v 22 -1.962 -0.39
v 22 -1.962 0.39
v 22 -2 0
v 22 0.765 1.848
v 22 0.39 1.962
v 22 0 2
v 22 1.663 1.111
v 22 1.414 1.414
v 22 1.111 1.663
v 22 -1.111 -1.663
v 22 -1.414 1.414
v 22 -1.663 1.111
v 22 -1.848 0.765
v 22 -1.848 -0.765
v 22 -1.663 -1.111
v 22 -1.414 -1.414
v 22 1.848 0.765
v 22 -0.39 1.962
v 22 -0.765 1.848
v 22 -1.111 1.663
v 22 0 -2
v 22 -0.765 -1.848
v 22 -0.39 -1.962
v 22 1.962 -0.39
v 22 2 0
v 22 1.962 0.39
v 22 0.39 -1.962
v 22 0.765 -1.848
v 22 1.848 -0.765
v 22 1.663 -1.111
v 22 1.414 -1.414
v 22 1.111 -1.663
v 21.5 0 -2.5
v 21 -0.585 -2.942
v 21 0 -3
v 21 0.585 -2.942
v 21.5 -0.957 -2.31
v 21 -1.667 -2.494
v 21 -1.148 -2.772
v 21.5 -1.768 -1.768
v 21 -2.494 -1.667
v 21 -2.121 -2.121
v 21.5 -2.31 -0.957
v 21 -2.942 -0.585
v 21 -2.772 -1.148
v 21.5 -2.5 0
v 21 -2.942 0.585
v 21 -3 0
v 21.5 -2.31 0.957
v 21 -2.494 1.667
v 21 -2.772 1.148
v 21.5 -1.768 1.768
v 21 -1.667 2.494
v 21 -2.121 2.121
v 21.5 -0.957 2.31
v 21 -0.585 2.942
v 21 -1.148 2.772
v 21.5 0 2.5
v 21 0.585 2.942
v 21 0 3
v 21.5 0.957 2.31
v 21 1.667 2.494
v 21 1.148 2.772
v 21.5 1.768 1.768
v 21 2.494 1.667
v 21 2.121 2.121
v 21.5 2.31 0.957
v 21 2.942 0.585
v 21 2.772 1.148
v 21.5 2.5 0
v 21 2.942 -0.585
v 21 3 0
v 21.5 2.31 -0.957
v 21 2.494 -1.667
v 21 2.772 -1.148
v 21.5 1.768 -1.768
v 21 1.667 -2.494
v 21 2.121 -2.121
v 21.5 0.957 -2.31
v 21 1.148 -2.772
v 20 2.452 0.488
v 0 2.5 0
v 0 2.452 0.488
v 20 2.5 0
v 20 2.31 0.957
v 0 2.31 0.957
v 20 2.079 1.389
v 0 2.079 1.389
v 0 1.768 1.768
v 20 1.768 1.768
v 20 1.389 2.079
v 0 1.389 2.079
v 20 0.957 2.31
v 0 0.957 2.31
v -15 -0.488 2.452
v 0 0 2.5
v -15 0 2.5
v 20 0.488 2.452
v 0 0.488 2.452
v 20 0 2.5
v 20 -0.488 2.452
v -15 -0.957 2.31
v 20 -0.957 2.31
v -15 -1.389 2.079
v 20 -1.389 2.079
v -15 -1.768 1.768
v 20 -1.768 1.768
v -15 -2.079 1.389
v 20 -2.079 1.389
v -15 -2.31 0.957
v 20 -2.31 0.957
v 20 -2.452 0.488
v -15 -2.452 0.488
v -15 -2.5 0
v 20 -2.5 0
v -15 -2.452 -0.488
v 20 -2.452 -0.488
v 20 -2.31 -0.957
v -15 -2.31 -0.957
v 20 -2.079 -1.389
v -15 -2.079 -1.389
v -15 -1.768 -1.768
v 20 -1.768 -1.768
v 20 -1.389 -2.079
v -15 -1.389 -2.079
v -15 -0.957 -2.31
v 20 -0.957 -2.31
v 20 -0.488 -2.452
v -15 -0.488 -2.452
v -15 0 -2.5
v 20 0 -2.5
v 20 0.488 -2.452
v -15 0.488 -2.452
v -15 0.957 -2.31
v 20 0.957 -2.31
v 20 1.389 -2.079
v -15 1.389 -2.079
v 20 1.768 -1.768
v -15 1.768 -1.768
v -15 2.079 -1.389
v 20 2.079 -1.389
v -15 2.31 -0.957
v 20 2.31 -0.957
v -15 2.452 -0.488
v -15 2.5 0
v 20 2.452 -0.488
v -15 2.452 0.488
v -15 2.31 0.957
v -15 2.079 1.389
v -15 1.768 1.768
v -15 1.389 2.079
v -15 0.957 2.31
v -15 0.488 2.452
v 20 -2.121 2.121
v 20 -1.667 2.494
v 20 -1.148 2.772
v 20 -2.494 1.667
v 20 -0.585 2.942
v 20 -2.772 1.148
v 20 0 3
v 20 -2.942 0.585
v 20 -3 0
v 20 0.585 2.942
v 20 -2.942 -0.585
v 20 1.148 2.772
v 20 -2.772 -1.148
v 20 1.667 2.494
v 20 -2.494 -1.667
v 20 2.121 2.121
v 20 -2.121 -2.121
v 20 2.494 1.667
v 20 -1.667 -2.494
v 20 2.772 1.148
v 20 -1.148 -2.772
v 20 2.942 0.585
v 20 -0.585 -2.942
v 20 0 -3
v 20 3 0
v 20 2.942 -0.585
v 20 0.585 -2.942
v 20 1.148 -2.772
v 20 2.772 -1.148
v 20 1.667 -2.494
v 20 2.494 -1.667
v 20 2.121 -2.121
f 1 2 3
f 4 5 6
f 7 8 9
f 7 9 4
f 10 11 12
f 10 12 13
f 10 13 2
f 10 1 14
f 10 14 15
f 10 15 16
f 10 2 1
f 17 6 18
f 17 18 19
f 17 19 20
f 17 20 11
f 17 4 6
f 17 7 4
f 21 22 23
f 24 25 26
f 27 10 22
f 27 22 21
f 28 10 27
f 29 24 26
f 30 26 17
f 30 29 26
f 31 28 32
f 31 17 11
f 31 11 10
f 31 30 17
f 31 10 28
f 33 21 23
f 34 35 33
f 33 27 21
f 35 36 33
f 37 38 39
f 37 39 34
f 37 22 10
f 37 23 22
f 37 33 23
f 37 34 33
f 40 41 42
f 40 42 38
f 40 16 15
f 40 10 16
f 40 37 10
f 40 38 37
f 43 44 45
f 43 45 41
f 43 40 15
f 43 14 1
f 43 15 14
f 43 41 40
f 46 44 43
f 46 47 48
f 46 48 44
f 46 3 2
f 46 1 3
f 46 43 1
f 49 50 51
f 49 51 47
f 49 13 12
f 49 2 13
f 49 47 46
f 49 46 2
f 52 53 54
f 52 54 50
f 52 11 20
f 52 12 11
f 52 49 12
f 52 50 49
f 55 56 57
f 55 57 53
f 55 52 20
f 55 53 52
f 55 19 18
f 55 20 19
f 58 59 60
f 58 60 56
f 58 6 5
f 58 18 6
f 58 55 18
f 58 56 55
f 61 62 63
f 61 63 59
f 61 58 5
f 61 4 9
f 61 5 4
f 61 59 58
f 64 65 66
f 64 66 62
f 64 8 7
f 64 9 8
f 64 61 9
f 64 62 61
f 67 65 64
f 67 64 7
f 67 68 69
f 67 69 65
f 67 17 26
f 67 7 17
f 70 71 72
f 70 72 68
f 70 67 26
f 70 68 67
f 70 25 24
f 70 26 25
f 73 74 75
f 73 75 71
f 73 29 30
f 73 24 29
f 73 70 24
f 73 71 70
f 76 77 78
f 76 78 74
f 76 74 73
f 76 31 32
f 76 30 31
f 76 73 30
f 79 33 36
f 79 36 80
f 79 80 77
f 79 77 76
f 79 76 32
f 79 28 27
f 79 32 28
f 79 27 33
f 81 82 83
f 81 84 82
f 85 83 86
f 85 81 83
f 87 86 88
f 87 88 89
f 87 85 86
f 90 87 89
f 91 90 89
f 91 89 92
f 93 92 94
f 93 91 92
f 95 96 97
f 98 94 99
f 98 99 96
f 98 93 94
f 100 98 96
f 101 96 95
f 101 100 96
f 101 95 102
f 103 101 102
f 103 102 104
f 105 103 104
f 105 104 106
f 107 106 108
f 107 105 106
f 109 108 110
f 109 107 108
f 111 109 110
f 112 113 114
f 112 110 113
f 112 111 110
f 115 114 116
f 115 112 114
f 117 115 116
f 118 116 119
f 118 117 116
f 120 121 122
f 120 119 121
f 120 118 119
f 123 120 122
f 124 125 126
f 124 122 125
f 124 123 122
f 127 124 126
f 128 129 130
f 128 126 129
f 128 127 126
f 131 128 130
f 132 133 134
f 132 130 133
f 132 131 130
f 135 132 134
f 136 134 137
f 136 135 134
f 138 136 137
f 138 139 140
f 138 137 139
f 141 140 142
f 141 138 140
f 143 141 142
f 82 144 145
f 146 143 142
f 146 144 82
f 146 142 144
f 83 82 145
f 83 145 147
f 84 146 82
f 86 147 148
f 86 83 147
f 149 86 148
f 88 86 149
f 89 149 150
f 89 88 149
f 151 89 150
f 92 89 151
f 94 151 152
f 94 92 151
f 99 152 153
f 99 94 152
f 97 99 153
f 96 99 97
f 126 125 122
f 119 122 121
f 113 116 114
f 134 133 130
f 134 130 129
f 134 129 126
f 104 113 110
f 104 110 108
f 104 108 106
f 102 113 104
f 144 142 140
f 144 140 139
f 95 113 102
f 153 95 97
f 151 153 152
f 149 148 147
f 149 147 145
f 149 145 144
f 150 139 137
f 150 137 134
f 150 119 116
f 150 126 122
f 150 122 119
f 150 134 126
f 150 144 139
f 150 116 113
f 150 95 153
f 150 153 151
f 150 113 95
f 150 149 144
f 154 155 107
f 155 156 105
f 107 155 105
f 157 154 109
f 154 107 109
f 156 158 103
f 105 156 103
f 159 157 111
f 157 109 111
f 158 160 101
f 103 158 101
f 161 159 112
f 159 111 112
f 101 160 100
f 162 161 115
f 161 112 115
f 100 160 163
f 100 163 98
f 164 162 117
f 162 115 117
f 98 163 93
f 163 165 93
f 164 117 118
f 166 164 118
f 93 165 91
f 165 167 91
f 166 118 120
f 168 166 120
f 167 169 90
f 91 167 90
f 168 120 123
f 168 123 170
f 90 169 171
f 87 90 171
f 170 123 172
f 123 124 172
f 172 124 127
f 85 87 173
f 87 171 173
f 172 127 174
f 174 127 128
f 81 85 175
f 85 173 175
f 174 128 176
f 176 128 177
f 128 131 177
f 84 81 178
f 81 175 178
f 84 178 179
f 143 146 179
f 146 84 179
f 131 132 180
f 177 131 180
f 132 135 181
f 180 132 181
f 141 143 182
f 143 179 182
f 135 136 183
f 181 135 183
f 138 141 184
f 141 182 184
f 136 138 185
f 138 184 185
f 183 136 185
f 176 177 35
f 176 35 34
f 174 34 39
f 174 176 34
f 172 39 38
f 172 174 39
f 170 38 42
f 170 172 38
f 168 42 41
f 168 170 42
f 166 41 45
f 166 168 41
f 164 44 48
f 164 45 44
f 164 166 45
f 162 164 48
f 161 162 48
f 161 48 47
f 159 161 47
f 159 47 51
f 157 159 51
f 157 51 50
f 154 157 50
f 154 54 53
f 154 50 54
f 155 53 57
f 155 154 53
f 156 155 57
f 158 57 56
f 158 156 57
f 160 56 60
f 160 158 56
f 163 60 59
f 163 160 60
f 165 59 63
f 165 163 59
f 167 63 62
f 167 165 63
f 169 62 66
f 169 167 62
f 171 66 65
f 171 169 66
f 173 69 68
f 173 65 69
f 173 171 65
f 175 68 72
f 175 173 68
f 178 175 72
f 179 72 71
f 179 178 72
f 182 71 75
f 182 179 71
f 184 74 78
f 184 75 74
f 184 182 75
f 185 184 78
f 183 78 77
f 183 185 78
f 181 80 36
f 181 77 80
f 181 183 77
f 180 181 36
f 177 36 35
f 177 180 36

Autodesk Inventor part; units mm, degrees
ref_plane "YZ Plane" through (0, 0, 0) normal (1, 0, 0) x (0, 1, 0)
ref_plane "XZ Plane" through (0, 0, 0) normal (0, 1, 0) x (-1, 0, 0)
ref_plane "XY Plane" through (0, 0, 0) normal (0, 0, 1) x (1, 0, 0)
sketch "Sketch1" plane through (0, 0, 0) normal (1, 0, 0) x (0, 1, 0)
  circle A0 centre (0, 0) radius 2.5
  dimension "d0" = 5
extrude "Extrusion1" add sketch "Sketch1" along normal blind 20
sketch "Sketch2" plane through (20, 0, 0) normal (1, 0, 0) x (0, 0, -1)
  circle A0 centre (0, 0) radius 3
  dimension "d3" = 6
extrude "Extrusion2" add sketch "Sketch2" along normal blind 2
chamfer "Chamfer1" distance 1 angle 45 1 edges at (22, 0, 3)
sketch "Sketch4" plane through (0, 0, 0) normal (-1, 0, 0) x (0, 0, 1)
  circle A0 centre (0, 0) radius 2.5
extrude "Extrusion4" add sketch "Sketch4" along normal blind 15
properties part number "Motor Shaft"
